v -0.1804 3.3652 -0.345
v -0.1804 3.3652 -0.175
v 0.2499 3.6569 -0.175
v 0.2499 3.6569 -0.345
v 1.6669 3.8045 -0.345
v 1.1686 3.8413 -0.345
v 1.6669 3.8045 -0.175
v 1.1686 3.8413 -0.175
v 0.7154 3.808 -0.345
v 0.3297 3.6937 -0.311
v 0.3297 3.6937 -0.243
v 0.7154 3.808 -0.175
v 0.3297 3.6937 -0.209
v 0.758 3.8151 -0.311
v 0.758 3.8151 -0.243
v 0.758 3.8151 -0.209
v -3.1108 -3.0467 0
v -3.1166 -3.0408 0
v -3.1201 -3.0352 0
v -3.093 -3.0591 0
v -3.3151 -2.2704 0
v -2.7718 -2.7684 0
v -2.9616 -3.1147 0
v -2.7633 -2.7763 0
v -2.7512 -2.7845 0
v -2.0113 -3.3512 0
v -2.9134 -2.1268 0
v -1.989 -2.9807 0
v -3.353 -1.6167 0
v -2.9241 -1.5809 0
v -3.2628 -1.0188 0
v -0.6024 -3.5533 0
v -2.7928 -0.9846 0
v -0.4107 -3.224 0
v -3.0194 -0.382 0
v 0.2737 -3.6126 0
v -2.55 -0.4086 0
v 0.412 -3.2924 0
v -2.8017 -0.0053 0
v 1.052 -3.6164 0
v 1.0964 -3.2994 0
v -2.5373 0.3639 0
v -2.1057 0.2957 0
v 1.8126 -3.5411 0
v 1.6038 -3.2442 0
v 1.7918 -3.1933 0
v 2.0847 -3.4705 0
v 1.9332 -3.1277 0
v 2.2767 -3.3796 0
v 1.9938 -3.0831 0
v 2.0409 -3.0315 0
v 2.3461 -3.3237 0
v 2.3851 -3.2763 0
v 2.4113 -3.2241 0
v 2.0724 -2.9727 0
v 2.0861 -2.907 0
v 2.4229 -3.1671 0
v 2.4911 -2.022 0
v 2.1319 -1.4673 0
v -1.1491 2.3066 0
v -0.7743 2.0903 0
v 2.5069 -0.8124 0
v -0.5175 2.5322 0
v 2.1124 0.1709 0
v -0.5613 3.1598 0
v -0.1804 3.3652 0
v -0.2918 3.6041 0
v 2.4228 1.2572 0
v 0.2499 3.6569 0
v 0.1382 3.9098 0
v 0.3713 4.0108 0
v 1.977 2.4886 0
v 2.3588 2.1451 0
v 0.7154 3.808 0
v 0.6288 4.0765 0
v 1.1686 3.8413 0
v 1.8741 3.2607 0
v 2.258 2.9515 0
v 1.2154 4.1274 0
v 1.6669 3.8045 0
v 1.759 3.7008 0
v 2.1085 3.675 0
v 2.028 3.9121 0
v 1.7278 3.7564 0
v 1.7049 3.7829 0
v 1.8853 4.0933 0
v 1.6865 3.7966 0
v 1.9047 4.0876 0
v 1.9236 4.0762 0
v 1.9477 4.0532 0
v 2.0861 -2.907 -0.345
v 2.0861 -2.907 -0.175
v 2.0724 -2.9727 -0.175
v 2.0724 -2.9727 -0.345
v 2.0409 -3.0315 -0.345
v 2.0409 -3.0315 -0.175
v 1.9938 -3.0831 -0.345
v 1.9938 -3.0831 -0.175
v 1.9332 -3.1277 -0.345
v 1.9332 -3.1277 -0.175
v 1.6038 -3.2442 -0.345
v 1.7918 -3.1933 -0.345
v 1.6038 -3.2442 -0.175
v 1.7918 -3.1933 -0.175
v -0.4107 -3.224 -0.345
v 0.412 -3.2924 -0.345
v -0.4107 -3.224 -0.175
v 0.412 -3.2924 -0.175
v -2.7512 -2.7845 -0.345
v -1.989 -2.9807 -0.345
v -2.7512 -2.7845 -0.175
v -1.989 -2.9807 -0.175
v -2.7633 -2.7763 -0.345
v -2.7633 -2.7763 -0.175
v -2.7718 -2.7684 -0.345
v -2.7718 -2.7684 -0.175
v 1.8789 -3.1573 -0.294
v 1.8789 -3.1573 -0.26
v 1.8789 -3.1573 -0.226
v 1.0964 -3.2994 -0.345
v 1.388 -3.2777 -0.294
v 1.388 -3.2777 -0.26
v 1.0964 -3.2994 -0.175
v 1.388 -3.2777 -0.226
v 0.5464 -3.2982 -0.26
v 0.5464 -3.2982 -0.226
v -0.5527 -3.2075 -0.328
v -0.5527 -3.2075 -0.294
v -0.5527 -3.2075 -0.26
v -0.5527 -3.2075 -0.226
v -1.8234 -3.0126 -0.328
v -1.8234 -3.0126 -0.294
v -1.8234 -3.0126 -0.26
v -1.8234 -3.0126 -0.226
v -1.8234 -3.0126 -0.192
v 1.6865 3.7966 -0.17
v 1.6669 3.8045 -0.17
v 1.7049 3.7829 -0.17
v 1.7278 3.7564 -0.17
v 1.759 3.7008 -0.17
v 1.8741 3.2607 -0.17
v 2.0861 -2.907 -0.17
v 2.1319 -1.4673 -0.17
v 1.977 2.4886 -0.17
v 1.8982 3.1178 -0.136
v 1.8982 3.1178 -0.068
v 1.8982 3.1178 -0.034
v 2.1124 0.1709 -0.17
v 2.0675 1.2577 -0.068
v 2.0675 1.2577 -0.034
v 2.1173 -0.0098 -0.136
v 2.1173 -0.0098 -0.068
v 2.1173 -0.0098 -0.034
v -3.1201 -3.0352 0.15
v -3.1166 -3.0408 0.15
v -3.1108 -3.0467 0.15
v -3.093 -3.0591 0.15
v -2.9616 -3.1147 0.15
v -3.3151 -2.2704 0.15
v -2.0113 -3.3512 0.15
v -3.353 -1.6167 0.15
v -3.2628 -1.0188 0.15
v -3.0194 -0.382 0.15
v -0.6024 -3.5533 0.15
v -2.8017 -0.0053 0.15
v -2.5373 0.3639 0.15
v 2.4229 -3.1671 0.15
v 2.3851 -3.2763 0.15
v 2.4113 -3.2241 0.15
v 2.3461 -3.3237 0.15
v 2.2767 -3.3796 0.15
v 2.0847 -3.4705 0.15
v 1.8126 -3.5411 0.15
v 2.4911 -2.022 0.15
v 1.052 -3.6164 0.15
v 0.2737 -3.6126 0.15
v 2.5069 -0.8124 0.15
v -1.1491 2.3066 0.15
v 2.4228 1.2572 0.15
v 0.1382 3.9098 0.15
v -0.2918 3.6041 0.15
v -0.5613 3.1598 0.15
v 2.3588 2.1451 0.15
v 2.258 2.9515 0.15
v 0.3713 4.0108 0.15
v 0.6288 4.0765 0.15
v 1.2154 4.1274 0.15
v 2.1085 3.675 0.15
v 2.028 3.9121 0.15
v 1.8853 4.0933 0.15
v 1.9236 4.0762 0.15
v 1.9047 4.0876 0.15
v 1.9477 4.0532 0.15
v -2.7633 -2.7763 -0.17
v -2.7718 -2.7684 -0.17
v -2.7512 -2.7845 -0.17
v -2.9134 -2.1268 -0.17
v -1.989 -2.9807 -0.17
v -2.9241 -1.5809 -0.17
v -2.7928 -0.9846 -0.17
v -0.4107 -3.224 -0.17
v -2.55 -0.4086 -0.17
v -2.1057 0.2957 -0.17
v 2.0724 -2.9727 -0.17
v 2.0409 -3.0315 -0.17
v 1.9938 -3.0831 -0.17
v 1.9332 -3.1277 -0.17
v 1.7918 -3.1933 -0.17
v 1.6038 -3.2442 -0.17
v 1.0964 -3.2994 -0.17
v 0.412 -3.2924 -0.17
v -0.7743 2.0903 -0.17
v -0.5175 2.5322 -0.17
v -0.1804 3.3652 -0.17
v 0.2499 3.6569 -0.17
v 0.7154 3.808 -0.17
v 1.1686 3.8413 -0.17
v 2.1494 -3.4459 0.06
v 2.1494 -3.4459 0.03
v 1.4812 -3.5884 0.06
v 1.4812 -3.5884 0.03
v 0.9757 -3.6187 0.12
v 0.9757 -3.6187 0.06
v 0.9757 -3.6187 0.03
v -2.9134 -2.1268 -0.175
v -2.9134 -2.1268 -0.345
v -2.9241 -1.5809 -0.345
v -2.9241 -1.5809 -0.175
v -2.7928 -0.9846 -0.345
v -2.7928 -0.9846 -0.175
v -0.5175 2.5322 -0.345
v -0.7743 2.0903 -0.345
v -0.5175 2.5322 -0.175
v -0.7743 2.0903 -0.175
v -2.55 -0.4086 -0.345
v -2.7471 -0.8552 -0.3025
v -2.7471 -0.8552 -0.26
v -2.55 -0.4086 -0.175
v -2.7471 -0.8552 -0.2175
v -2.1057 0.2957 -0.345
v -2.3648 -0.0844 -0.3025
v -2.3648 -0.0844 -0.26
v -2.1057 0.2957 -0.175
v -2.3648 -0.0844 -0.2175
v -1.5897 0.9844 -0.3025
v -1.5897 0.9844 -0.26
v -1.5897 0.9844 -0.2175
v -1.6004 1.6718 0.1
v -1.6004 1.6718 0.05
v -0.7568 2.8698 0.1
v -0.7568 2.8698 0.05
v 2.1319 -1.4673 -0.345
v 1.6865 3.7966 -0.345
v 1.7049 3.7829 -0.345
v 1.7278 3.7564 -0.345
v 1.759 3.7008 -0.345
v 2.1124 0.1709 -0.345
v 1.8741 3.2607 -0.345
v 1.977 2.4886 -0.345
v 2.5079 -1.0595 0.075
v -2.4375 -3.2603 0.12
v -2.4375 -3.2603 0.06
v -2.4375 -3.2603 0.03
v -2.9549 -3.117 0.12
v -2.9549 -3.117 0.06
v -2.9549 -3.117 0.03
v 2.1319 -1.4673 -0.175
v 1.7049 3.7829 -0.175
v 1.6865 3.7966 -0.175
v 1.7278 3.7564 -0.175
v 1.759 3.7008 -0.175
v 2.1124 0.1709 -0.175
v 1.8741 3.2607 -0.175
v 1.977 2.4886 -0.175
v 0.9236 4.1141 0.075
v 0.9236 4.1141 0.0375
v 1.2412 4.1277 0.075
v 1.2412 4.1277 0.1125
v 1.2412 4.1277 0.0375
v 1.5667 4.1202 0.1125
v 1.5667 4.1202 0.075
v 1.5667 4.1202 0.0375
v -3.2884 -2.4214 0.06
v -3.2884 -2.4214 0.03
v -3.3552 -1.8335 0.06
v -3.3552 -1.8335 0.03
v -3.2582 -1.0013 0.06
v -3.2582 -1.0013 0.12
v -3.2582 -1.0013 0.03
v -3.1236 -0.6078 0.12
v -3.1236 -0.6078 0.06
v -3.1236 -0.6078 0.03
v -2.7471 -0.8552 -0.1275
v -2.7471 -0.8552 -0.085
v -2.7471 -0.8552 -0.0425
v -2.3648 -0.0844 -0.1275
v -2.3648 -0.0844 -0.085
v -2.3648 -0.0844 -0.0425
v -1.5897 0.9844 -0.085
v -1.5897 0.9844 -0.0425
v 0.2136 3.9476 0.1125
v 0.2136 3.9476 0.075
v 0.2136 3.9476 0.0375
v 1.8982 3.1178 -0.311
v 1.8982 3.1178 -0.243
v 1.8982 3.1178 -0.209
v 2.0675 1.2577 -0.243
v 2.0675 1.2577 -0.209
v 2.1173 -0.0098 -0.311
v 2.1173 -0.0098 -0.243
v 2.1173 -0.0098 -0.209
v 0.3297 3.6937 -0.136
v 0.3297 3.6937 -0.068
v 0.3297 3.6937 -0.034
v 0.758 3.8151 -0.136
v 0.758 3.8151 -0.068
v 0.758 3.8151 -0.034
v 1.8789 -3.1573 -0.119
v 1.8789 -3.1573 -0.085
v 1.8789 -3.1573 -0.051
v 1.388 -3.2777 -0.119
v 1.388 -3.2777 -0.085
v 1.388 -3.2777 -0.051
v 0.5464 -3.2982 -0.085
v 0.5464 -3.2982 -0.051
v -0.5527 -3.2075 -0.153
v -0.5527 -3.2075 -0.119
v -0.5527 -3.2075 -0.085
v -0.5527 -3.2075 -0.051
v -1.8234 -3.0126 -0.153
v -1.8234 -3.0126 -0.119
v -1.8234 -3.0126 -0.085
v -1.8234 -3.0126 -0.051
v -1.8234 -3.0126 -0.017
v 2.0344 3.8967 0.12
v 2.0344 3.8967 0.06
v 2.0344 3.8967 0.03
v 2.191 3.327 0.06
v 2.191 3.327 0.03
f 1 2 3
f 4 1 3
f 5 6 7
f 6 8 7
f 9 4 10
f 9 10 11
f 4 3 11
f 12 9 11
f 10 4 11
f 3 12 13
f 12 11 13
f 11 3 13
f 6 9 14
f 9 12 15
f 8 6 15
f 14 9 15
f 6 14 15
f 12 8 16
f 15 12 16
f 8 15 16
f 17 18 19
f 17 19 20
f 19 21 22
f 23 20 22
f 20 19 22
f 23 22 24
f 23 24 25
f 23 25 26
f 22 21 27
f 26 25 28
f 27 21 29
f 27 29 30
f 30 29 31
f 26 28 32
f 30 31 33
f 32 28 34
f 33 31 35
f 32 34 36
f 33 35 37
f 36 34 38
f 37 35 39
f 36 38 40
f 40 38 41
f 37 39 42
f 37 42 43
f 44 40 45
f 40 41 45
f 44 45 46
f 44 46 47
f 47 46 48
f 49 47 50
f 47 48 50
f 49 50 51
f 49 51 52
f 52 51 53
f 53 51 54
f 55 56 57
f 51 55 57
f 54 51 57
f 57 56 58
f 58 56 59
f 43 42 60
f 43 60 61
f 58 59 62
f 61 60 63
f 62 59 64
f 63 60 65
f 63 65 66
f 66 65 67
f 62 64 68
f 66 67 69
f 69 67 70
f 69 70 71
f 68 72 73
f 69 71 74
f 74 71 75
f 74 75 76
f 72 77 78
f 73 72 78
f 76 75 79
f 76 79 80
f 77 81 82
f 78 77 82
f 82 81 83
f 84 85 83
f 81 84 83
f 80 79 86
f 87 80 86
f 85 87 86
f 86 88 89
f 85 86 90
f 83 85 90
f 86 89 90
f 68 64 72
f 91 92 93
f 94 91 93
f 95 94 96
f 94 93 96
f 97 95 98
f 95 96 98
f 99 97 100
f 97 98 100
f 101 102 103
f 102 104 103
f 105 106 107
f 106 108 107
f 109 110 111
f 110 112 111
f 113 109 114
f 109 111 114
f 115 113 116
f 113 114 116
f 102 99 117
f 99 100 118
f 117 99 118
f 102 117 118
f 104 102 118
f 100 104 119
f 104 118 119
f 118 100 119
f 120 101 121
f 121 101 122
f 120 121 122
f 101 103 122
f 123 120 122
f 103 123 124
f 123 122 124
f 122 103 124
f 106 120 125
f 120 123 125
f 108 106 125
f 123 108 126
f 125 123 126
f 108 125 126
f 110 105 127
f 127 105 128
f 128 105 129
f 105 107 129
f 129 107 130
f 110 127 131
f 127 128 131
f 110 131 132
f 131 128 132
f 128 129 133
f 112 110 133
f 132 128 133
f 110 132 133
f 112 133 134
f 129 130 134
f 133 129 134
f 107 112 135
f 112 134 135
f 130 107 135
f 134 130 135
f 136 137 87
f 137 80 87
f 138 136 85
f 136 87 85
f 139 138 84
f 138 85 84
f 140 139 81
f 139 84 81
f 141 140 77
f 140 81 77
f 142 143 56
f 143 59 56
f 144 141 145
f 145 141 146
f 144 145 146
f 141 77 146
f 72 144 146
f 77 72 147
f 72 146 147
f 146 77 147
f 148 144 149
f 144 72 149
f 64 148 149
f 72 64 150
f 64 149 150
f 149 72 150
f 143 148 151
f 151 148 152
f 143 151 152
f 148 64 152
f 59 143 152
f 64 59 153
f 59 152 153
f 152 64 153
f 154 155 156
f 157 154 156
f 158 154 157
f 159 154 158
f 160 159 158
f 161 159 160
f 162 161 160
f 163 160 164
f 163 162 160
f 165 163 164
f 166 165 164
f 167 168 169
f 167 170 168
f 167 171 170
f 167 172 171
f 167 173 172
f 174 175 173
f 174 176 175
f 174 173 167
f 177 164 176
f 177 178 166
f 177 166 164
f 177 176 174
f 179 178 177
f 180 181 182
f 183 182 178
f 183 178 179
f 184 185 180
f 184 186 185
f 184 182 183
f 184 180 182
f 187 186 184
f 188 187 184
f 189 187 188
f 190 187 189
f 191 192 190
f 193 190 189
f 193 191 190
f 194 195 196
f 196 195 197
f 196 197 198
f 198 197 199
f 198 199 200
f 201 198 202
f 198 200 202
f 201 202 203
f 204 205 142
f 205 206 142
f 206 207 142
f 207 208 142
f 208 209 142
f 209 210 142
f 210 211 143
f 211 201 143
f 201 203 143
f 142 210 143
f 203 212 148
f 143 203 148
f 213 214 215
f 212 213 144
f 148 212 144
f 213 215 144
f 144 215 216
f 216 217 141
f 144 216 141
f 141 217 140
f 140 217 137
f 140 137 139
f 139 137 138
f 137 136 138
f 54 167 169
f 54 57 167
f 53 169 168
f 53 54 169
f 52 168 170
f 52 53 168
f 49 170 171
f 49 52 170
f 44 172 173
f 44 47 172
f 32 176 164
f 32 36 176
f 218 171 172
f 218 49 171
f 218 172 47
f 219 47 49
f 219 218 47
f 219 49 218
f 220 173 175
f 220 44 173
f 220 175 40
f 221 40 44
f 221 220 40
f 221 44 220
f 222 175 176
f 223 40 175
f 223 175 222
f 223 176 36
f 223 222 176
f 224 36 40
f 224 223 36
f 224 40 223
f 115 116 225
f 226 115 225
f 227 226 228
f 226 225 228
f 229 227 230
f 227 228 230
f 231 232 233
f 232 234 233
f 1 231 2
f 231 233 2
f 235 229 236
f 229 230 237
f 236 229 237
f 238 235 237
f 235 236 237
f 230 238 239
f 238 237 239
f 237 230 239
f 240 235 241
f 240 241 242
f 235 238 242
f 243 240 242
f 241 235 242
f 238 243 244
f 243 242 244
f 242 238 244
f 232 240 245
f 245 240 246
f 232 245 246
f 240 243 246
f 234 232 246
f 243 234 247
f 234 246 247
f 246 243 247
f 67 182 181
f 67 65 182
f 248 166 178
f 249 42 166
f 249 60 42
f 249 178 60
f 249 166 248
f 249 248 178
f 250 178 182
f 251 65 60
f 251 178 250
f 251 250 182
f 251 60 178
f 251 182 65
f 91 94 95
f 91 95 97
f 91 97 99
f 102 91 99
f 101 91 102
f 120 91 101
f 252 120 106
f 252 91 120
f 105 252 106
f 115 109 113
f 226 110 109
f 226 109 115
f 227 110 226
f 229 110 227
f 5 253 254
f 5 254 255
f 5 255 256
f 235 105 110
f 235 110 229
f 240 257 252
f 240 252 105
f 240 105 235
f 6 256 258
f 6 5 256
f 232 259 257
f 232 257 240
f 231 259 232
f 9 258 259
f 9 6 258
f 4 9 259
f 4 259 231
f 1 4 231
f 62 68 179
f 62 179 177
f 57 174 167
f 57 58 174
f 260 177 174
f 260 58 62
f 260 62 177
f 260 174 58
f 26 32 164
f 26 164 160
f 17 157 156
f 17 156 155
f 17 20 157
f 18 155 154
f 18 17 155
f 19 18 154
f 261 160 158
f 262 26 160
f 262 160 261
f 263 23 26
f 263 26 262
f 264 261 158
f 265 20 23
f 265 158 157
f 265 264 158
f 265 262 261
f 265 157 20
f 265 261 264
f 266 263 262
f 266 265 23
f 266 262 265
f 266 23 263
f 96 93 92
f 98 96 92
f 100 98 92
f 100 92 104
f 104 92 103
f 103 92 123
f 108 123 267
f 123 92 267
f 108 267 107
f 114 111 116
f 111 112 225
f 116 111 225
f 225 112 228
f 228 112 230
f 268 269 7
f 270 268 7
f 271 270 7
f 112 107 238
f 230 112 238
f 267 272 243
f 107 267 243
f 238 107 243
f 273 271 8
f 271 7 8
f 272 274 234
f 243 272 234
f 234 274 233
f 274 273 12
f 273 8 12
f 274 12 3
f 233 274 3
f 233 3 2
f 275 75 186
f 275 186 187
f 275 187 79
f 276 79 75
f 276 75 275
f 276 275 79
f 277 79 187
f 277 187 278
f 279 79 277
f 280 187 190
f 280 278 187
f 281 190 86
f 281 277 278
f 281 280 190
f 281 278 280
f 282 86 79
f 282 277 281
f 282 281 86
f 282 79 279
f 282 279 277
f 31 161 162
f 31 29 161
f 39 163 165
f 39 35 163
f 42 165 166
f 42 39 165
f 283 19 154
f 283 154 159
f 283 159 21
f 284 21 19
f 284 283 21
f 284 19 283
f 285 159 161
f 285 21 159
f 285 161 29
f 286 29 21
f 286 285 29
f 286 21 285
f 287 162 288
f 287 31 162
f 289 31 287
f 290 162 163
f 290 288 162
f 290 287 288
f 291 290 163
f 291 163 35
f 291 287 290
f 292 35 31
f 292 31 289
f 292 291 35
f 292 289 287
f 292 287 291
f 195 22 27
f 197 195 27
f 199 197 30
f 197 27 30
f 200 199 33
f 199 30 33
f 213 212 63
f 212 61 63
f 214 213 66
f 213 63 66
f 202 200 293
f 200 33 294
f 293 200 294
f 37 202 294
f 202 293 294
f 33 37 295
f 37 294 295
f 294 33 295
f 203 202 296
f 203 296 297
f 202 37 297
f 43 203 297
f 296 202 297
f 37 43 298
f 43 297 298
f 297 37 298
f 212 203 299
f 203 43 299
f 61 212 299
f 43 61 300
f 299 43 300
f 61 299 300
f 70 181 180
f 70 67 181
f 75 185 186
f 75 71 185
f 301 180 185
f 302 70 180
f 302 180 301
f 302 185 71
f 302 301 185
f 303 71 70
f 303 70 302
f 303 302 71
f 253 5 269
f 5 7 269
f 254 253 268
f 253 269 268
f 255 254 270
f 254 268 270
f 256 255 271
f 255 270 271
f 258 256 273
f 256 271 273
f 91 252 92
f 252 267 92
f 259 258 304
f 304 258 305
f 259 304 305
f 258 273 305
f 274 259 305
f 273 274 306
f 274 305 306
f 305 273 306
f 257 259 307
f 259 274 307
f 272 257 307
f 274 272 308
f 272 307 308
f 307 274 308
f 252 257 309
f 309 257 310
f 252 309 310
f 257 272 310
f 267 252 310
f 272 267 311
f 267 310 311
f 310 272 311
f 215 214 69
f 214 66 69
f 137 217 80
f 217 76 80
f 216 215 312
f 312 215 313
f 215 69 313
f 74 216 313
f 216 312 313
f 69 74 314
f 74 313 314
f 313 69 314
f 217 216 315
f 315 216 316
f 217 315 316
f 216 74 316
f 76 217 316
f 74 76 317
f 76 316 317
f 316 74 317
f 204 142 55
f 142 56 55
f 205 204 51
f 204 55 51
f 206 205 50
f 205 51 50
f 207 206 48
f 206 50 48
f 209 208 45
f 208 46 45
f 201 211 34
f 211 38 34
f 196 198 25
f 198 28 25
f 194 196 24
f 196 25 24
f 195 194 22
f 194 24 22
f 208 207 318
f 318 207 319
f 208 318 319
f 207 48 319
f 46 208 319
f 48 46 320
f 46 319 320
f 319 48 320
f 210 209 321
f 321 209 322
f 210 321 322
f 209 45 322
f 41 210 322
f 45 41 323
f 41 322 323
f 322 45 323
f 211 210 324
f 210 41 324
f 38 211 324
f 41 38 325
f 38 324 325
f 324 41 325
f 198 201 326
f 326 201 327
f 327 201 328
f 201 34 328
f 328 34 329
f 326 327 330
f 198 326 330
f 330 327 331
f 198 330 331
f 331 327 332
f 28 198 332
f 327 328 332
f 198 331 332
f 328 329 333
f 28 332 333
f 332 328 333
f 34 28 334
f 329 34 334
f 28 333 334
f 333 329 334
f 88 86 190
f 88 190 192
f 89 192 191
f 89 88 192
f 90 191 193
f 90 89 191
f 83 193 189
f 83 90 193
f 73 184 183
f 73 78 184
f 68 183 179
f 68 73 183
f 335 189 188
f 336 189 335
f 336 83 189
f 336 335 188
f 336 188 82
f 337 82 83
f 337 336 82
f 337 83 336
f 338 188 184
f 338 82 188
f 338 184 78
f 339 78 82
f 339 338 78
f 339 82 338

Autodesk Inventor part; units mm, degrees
ref_plane "YZ Plane" through (0, 0, 0) normal (1, 0, 0) x (0, 1, 0)
ref_plane "XZ Plane" through (0, 0, 0) normal (0, 1, 0) x (-1, 0, 0)
sketch "Sketch1-Imported DXF File" plane through (0, 0, 0) normal (0, 0, 1) x (1, 0, 0)
  spline S0 degree 3 poles (-0.1804, 3.3652) (0.3809, 3.8577) (0.9425, 3.8911) (1.6669, 3.8045) knots 0 0 0 0 1 1 1 1
  line L0 (-0.1804, 3.3652) -> (0.3809, 3.8577) construction
  line L1 (0.3809, 3.8577) -> (0.9425, 3.8911) construction
  line L2 (0.9425, 3.8911) -> (1.6669, 3.8045) construction
  spline S1 degree 3 poles (1.6669, 3.8045) (2.052, 3.7584) (2.2228, -0.9315) (2.0861, -2.907) knots 1 1 1 1 2 2 2 2
  line L3 (1.6669, 3.8045) -> (2.052, 3.7584) construction
  line L4 (2.052, 3.7584) -> (2.2228, -0.9315) construction
  line L5 (2.2228, -0.9315) -> (2.0861, -2.907) construction
  spline S2 degree 3 poles (2.0861, -2.907) (2.0239, -3.807) (-2.7213, -2.918) (-2.7718, -2.7684) knots 2 2 2 2 3 3 3 3
  line L6 (2.0861, -2.907) -> (2.0239, -3.807) construction
  line L7 (2.0239, -3.807) -> (-2.7213, -2.918) construction
  line L8 (-2.7213, -2.918) -> (-2.7718, -2.7684) construction
  spline S3 degree 3 poles (-2.7718, -2.7684) (-3.6279, -0.2341) (-0.832, 1.069) (-0.1804, 3.3652) knots 3 3 3 3 4 4 4 4
  line L9 (-2.7718, -2.7684) -> (-3.6279, -0.2341) construction
  line L10 (-3.6279, -0.2341) -> (-0.832, 1.069) construction
  line L11 (-0.832, 1.069) -> (-0.1804, 3.3652) construction
  spline S4 degree 3 poles (-0.2918, 3.6041) (0.022, 3.8725) (0.2642, 4.0092) (0.6288, 4.0765) knots 0 0 0 0 1 1 1 1
  line L12 (-0.2918, 3.6041) -> (0.022, 3.8725) construction
  line L13 (0.022, 3.8725) -> (0.2642, 4.0092) construction
  line L14 (0.2642, 4.0092) -> (0.6288, 4.0765) construction
  spline S5 degree 3 poles (0.6288, 4.0765) (0.9935, 4.1434) (1.4802, 4.1406) (1.8853, 4.0933) knots 1 1 1 1 2 2 2 2
  line L15 (0.6288, 4.0765) -> (0.9935, 4.1434) construction
  line L16 (0.9935, 4.1434) -> (1.4802, 4.1406) construction
  line L17 (1.4802, 4.1406) -> (1.8853, 4.0933) construction
  spline S6 degree 3 poles (1.8853, 4.0933) (2.1007, 4.068) (2.348, 2.7989) (2.4228, 1.2572) knots 2 2 2 2 3 3 3 3
  line L18 (1.8853, 4.0933) -> (2.1007, 4.068) construction
  line L19 (2.1007, 4.068) -> (2.348, 2.7989) construction
  line L20 (2.348, 2.7989) -> (2.4228, 1.2572) construction
  spline S7 degree 3 poles (2.4228, 1.2572) (2.5251, -0.8485) (2.5466, -1.4274) (2.4229, -3.1671) knots 3 3 3 3 4 4 4 4
  line L21 (2.4228, 1.2572) -> (2.5251, -0.8485) construction
  line L22 (2.5251, -0.8485) -> (2.5466, -1.4274) construction
  line L23 (2.5466, -1.4274) -> (2.4229, -3.1671) construction
  spline S8 degree 3 poles (2.4229, -3.1671) (2.3865, -3.6579) (0.7942, -3.6867) (-0.6024, -3.5533) knots 4 4 4 4 5 5 5 5
  line L24 (2.4229, -3.1671) -> (2.3865, -3.6579) construction
  line L25 (2.3865, -3.6579) -> (0.7942, -3.6867) construction
  line L26 (0.7942, -3.6867) -> (-0.6024, -3.5533) construction
  spline S9 degree 3 poles (-0.6024, -3.5533) (-1.9971, -3.4205) (-3.0918, -3.117) (-3.1201, -3.0352) knots 5 5 5 5 6 6 6 6
  line L27 (-0.6024, -3.5533) -> (-1.9971, -3.4205) construction
  line L28 (-1.9971, -3.4205) -> (-3.0918, -3.117) construction
  line L29 (-3.0918, -3.117) -> (-3.1201, -3.0352) construction
  spline S10 degree 3 poles (-3.1201, -3.0352) (-3.5986, -1.6526) (-3.3227, -0.6417) (-2.5373, 0.3639) knots 6 6 6 6 7 7 7 7
  line L30 (-3.1201, -3.0352) -> (-3.5986, -1.6526) construction
  line L31 (-3.5986, -1.6526) -> (-3.3227, -0.6417) construction
  line L32 (-3.3227, -0.6417) -> (-2.5373, 0.3639) construction
  spline S11 degree 3 poles (-2.5373, 0.3639) (-2.5757, 0.3147) (-0.3637, 3.3574) (-0.2918, 3.6041) knots 7 7 7 7 8 8 8 8
  line L33 (-2.5373, 0.3639) -> (-2.5757, 0.3147) construction
  line L34 (-2.5757, 0.3147) -> (-0.3637, 3.3574) construction
  line L35 (-0.3637, 3.3574) -> (-0.2918, 3.6041) construction
  point P0 (0, 0)
sketch "Sketch2" plane through (0, 0, 0) normal (0, 0, 1) x (1, 0, 0)
  spline S0 degree 3 poles (-2.5373, 0.3639) (-1.6488, 1.609) (-0.4725, 3.2194) (-0.2918, 3.6041) knots 0 0 0 0 1 1 1 1
  spline S1 degree 4 poles (-0.2918, 3.6041) (-0.1205, 3.7459) (-0.0329, 3.81) (0.1033, 3.8971) (0.3083, 3.9925) (0.4387, 4.0359) (0.5464, 4.0612) (0.6288, 4.0765) knots 0 0 0 0 0 0.40557 0.536324 0.666446 1 1 1 1 1
  spline S2 degree 4 poles (0.6288, 4.0765) (0.9071, 4.1274) (1.236, 4.141) (1.575, 4.1295) (1.8853, 4.0933) knots 0 0 0 0 0 1 1 1 1 1
  spline S3 degree 4 poles (1.8853, 4.0933) (1.9276, 4.0877) (1.9882, 4.0171) (2.0671, 3.8369) (2.1609, 3.4899) (2.2808, 2.8848) (2.3582, 2.2428) (2.4023, 1.6844) (2.4228, 1.2572) knots 0 0 0 0 0 0.177655 0.283389 0.412601 0.562831 1 1 1 1 1
  spline S4 degree 2 poles (2.4228, 1.2572) (2.593, -1.164) (2.4229, -3.1671) knots 0 0 0 1 1 1
  spline S5 degree 4 poles (2.4229, -3.1671) (2.4172, -3.2595) (2.3276, -3.3767) (2.0958, -3.4872) (1.6709, -3.5741) (1.0134, -3.6358) (0.3511, -3.6264) (-0.2019, -3.5916) (-0.6024, -3.5533) knots 0 0 0 0 0 0.212151 0.321828 0.449986 0.594733 1 1 1 1 1
  spline S6 degree 4 poles (-0.6024, -3.5533) (-0.978, -3.5176) (-1.4691, -3.4535) (-2.0388, -3.3544) (-2.5835, -3.2276) (-2.8889, -3.1434) (-3.048, -3.0858) (-3.1131, -3.0522) (-3.1201, -3.0352) knots 0 0 0 0 0 0.445751 0.600467 0.733494 0.840359 1 1 1 1 1
  spline S7 degree 4 poles (-3.1201, -3.0352) (-3.2285, -2.7218) (-3.3346, -2.3022) (-3.3861, -1.7902) (-3.3167, -1.2009) (-3.1666, -0.6409) (-2.9464, -0.2048) (-2.7224, 0.1268) (-2.5373, 0.3639) knots 0 0 0 0 0 0.32417 0.44647 0.56674 0.687368 1 1 1 1 1
  point P0 (0, 0)
  point P1 (-1.292, 2.1047)
  point P2 (-0.5022, 3.2501)
  point P3 (-0.0522, 3.7921)
  point P4 (0.0556, 3.8626)
  point P5 (0.161, 3.9217)
  point P6 (0.2674, 3.9714)
  point P7 (0.3783, 4.0131)
  point P8 (0.4974, 4.0479)
  point P9 (0.9057, 4.1126)
  point P10 (1.2248, 4.1276)
  point P11 (1.5614, 4.1204)
  point P12 (1.9311, 4.07)
  point P13 (1.9884, 3.9938)
  point P14 (2.0595, 3.8309)
  point P15 (2.1406, 3.5531)
  point P16 (2.2254, 3.1463)
  point P17 (2.3061, 2.6141)
  point P18 (2.3745, 1.9749)
  point P19 (2.5077, -1.1636)
  point P20 (2.3812, -3.282)
  point P21 (2.2671, -3.3858)
  point P22 (2.057, -3.4798)
  point P23 (1.7287, -3.556)
  point P24 (1.2755, -3.6054)
  point P25 (0.7111, -3.6217)
  point P26 (0.0687, -3.6033)
  point P27 (-1.2291, -3.4803)
  point P28 (-1.7932, -3.3917)
  point P29 (-2.2714, -3.2978)
  point P30 (-2.6442, -3.2091)
  point P31 (-2.9004, -3.1353)
  point P32 (-3.0452, -3.0825)
  point P33 (-3.1053, -3.051)
  point P34 (-3.2685, -2.516)
  point P35 (-3.343, -2.0448)
  point P36 (-3.3527, -1.6099)
  point P37 (-3.3039, -1.2004)
  point P38 (-3.1992, -0.8068)
  point P39 (-3.0385, -0.4203)
  point P40 (-2.8193, -0.0327)
extrude "Extrusion1-Larger Window" add sketch "Sketch2" along normal blind 0.15
sketch "Sketch3" plane through (0, 0, 0) normal (0, 0, 1) x (1, 0, 0)
  spline S0 degree 4 poles (-2.7718, -2.7684) (-2.9175, -2.2324) (-3.0654, -1.6105) (-2.6833, -0.5765) (-2.0778, 0.4174) (-0.2063, 2.7122) (-0.5864, 2.4953) (-0.1804, 3.3652) knots 0 0 0 0 0 0.323574 0.472009 0.62378 1 1 1 1 1
  spline S1 degree 4 poles (-0.1804, 3.3652) (-0.0582, 3.4724) (0.1156, 3.598) (0.3471, 3.7164) (0.6472, 3.8004) (0.9667, 3.849) (1.2484, 3.8466) (1.4846, 3.8262) (1.6669, 3.8045) knots 0 0 0 0 0 0.310542 0.430474 0.550556 0.673226 1 1 1 1 1
  spline S2 degree 4 poles (1.6669, 3.8045) (1.753, 3.7839) (1.8418, 3.5031) (1.9497, 2.8772) (2.0432, 1.772) (2.1286, 0.1628) (2.1456, -1.2825) (2.1266, -2.3145) (2.0861, -2.907) knots 0 0 0 0 0 0.191178 0.313183 0.458164 0.615426 1 1 1 1 1
  spline S3 degree 4 poles (2.0861, -2.907) (2.0814, -2.9893) (2.0169, -3.0937) (1.8459, -3.1913) (1.5284, -3.2661) (1.1923, -3.3011) (0.7723, -3.3097) (0.275, -3.2892) (-0.2688, -3.2444) (-0.8928, -3.1666) (-1.4631, -3.0854) (-2.4303, -2.9022) (-2.7344, -2.812) (-2.7718, -2.7684) knots 0 0 0 0 0 0.121837 0.181897 0.251545 0.330741 0.418194 0.511774 0.608711 0.713595 0.815227 1 1 1 1 1
  point P0 (0, 0)
  point P1 (0.0266, 3.5263)
  point P2 (0.2302, 3.6471)
  point P3 (0.435, 3.7348)
  point P4 (0.6457, 3.7943)
  point P5 (0.8675, 3.8291)
  point P6 (1.1063, 3.8415)
  point P7 (1.3693, 3.8329)
  point P8 (1.737, 3.7424)
  point P9 (1.8285, 3.4825)
  point P10 (1.9312, 2.8876)
  point P11 (2.0254, 1.9214)
  point P12 (2.0951, 0.6699)
  point P13 (2.1298, -0.6901)
  point P14 (2.1256, -1.9444)
  point P15 (2.0516, -3.0154)
  point P16 (1.9634, -3.1075)
  point P17 (1.8086, -3.1872)
  point P18 (1.5702, -3.2508)
  point P19 (1.2383, -3.2915)
  point P20 (0.813, -3.3041)
  point P21 (0.3073, -3.2867)
  point P22 (-0.2547, -3.2408)
  point P23 (-0.8389, -3.1716)
  point P24 (-1.4037, -3.0874)
  point P25 (-2.3015, -2.9158)
  point P26 (-2.71, -2.8043)
  point P27 (-2.9305, -1.9534)
  point P28 (-2.8622, -1.2244)
  point P29 (-2.6092, -0.5289)
  point P30 (-2.1892, 0.1783)
  point P31 (-0.9618, 1.8213)
  point P32 (-0.4934, 2.5857)
extrude "Extrusion2" add sketch "Sketch3" against normal blind 0.17
ref_plane "Work Plane1" through (0, 0, -0.175) normal (0, 0, -1) x (-1, 0, 0)
sketch "Sketch4" plane through (0, 0, -0.175) normal (0, 0, -1) x (-1, 0, 0)
  spline S0 degree 4 poles (2.7718, -2.7684) (2.9175, -2.2324) (3.0654, -1.6105) (2.6833, -0.5765) (2.0778, 0.4174) (0.2063, 2.7122) (0.5864, 2.4953) (0.1804, 3.3652) knots 0 0 0 0 0 0.323574 0.472009 0.62378 1 1 1 1 1 projected
  spline S1 degree 4 poles (0.1804, 3.3652) (0.0582, 3.4724) (-0.1156, 3.598) (-0.3471, 3.7164) (-0.6472, 3.8004) (-0.9667, 3.849) (-1.2484, 3.8466) (-1.4846, 3.8262) (-1.6669, 3.8045) knots 0 0 0 0 0 0.310542 0.430474 0.550556 0.673226 1 1 1 1 1 projected
  spline S2 degree 4 poles (-1.6669, 3.8045) (-1.753, 3.7839) (-1.8418, 3.5031) (-1.9497, 2.8772) (-2.0432, 1.772) (-2.1286, 0.1628) (-2.1456, -1.2825) (-2.1266, -2.3145) (-2.0861, -2.907) knots 0 0 0 0 0 0.191178 0.313183 0.458164 0.615426 1 1 1 1 1 projected
  spline S3 degree 4 poles (-2.0861, -2.907) (-2.0814, -2.9893) (-2.0169, -3.0937) (-1.8459, -3.1913) (-1.5284, -3.2661) (-1.1923, -3.3011) (-0.7723, -3.3097) (-0.275, -3.2892) (0.2688, -3.2444) (0.8928, -3.1666) (1.4631, -3.0854) (2.4303, -2.9022) (2.7344, -2.812) (2.7718, -2.7684) knots 0 0 0 0 0 0.121837 0.181897 0.251545 0.330741 0.418194 0.511774 0.608711 0.713595 0.815227 1 1 1 1 1 projected
  point P0 (0, 0)
extrude "Extrusion3" add sketch "Sketch4" along normal blind 0.17
sketch "Sketch5" plane through (0, 0, 0) normal (0, 0, 1) x (1, 0, 0)
  line L0 (-3.3583, -0.7328) -> (-3.3583, -3.6344)
  line L1 (2.5057, -3.6344) -> (2.5057, 4.1337)
  line L2 (0.1055, 4.1337) -> (2.5057, 4.1337)
  line L3 (-3.3583, -3.6344) -> (2.5057, -3.6344)
  line L4 (-3.3583, -0.7328) -> (0.1055, 4.1337)
  point P0 (0, 0)
  dimension "d7" = 5.864
  dimension "d8" = 7.7681
  dimension "d9" = 2.9016
  dimension "d10" = 2.4002
  dimension "d11" = 144.558
properties material "GLASS, BOROSILICATE"
